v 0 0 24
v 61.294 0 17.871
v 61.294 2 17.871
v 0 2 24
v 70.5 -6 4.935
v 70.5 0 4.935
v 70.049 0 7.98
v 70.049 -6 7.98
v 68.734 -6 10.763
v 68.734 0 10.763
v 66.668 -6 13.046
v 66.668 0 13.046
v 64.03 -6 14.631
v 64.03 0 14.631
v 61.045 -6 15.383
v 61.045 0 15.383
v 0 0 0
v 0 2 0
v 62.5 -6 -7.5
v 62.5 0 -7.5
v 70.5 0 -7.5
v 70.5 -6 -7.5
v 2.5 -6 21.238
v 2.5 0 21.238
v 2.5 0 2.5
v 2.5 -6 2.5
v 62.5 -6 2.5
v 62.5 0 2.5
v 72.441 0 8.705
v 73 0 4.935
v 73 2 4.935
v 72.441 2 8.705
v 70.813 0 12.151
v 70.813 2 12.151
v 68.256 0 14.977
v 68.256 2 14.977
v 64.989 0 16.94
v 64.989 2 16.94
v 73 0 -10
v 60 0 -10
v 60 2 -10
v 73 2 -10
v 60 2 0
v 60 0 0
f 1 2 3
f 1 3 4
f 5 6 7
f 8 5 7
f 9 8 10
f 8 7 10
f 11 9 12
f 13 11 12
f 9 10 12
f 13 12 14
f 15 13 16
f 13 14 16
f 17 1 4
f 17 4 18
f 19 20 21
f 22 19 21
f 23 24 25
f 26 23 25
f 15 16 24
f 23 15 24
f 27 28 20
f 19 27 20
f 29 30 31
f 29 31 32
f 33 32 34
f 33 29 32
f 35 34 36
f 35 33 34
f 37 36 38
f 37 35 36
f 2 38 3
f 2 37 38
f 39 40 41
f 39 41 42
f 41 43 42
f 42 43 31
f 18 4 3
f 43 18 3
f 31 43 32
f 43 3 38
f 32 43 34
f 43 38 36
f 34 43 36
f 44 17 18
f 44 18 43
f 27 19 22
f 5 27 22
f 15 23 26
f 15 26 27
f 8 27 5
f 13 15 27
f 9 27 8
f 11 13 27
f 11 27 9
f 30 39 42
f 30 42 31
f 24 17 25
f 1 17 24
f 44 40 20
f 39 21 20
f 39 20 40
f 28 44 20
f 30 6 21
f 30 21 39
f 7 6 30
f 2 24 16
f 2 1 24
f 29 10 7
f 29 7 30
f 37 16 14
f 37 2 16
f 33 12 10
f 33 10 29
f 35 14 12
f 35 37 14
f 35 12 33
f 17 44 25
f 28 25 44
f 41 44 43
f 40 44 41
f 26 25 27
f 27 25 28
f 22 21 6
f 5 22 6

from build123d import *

# Parameters (mm, degrees)
F1_DEPTH = 2
F2_DEPTH = 6


with BuildPart() as f1:
    # F0 (on Front) → F1 (new body)
    with BuildSketch(Plane.XZ):
        with BuildLine():
            Line((0, 24), (0, 0))
            Line((0, 0), (60, 0))
            Line((60, 0), (60, -10))
            Line((60, -10), (73, -10))
            Line((73, -10), (73, 4.935162))
            ThreePointArc((73, 4.935162), (69.638883, 13.658231), (61.293548, 17.870645))
            Line((61.293548, 17.870645), (0, 24))
        make_face()
        with BuildLine():
            Line((62.5, 2.5), (2.5, 2.5))
            Line((2.5, 2.5), (2.5, 21.237531))
            Line((2.5, 21.237531), (61.044789, 15.383052))
            ThreePointArc((61.044789, 15.383052), (67.785252, 11.980718), (70.5, 4.935162))
            Line((70.5, 4.935162), (70.5, -7.5))
            Line((70.5, -7.5), (62.5, -7.5))
            Line((62.5, -7.5), (62.5, 2.5))
        make_face(mode=Mode.SUBTRACT)
        with BuildLine():
            Line((2.5, 21.237531), (2.5, 2.5))
            Line((2.5, 2.5), (62.5, 2.5))
            Line((62.5, 2.5), (62.5, -7.5))
            Line((62.5, -7.5), (70.5, -7.5))
            Line((70.5, -7.5), (70.5, 4.935162))
            ThreePointArc((70.5, 4.935162), (67.785252, 11.980718), (61.044789, 15.383052))
            Line((61.044789, 15.383052), (2.5, 21.237531))
        make_face()
    extrude(amount=-F1_DEPTH)

    # F0 (on Front) → F2 (join)
    with BuildSketch(Plane.XZ):
        with BuildLine():
            Line((2.5, 21.237531), (2.5, 2.5))
            Line((2.5, 2.5), (62.5, 2.5))
            Line((62.5, 2.5), (62.5, -7.5))
            Line((62.5, -7.5), (70.5, -7.5))
            Line((70.5, -7.5), (70.5, 4.935162))
            ThreePointArc((70.5, 4.935162), (67.785252, 11.980718), (61.044789, 15.383052))
            Line((61.044789, 15.383052), (2.5, 21.237531))
        make_face()
    extrude(amount=F2_DEPTH)


solid = f1.part
